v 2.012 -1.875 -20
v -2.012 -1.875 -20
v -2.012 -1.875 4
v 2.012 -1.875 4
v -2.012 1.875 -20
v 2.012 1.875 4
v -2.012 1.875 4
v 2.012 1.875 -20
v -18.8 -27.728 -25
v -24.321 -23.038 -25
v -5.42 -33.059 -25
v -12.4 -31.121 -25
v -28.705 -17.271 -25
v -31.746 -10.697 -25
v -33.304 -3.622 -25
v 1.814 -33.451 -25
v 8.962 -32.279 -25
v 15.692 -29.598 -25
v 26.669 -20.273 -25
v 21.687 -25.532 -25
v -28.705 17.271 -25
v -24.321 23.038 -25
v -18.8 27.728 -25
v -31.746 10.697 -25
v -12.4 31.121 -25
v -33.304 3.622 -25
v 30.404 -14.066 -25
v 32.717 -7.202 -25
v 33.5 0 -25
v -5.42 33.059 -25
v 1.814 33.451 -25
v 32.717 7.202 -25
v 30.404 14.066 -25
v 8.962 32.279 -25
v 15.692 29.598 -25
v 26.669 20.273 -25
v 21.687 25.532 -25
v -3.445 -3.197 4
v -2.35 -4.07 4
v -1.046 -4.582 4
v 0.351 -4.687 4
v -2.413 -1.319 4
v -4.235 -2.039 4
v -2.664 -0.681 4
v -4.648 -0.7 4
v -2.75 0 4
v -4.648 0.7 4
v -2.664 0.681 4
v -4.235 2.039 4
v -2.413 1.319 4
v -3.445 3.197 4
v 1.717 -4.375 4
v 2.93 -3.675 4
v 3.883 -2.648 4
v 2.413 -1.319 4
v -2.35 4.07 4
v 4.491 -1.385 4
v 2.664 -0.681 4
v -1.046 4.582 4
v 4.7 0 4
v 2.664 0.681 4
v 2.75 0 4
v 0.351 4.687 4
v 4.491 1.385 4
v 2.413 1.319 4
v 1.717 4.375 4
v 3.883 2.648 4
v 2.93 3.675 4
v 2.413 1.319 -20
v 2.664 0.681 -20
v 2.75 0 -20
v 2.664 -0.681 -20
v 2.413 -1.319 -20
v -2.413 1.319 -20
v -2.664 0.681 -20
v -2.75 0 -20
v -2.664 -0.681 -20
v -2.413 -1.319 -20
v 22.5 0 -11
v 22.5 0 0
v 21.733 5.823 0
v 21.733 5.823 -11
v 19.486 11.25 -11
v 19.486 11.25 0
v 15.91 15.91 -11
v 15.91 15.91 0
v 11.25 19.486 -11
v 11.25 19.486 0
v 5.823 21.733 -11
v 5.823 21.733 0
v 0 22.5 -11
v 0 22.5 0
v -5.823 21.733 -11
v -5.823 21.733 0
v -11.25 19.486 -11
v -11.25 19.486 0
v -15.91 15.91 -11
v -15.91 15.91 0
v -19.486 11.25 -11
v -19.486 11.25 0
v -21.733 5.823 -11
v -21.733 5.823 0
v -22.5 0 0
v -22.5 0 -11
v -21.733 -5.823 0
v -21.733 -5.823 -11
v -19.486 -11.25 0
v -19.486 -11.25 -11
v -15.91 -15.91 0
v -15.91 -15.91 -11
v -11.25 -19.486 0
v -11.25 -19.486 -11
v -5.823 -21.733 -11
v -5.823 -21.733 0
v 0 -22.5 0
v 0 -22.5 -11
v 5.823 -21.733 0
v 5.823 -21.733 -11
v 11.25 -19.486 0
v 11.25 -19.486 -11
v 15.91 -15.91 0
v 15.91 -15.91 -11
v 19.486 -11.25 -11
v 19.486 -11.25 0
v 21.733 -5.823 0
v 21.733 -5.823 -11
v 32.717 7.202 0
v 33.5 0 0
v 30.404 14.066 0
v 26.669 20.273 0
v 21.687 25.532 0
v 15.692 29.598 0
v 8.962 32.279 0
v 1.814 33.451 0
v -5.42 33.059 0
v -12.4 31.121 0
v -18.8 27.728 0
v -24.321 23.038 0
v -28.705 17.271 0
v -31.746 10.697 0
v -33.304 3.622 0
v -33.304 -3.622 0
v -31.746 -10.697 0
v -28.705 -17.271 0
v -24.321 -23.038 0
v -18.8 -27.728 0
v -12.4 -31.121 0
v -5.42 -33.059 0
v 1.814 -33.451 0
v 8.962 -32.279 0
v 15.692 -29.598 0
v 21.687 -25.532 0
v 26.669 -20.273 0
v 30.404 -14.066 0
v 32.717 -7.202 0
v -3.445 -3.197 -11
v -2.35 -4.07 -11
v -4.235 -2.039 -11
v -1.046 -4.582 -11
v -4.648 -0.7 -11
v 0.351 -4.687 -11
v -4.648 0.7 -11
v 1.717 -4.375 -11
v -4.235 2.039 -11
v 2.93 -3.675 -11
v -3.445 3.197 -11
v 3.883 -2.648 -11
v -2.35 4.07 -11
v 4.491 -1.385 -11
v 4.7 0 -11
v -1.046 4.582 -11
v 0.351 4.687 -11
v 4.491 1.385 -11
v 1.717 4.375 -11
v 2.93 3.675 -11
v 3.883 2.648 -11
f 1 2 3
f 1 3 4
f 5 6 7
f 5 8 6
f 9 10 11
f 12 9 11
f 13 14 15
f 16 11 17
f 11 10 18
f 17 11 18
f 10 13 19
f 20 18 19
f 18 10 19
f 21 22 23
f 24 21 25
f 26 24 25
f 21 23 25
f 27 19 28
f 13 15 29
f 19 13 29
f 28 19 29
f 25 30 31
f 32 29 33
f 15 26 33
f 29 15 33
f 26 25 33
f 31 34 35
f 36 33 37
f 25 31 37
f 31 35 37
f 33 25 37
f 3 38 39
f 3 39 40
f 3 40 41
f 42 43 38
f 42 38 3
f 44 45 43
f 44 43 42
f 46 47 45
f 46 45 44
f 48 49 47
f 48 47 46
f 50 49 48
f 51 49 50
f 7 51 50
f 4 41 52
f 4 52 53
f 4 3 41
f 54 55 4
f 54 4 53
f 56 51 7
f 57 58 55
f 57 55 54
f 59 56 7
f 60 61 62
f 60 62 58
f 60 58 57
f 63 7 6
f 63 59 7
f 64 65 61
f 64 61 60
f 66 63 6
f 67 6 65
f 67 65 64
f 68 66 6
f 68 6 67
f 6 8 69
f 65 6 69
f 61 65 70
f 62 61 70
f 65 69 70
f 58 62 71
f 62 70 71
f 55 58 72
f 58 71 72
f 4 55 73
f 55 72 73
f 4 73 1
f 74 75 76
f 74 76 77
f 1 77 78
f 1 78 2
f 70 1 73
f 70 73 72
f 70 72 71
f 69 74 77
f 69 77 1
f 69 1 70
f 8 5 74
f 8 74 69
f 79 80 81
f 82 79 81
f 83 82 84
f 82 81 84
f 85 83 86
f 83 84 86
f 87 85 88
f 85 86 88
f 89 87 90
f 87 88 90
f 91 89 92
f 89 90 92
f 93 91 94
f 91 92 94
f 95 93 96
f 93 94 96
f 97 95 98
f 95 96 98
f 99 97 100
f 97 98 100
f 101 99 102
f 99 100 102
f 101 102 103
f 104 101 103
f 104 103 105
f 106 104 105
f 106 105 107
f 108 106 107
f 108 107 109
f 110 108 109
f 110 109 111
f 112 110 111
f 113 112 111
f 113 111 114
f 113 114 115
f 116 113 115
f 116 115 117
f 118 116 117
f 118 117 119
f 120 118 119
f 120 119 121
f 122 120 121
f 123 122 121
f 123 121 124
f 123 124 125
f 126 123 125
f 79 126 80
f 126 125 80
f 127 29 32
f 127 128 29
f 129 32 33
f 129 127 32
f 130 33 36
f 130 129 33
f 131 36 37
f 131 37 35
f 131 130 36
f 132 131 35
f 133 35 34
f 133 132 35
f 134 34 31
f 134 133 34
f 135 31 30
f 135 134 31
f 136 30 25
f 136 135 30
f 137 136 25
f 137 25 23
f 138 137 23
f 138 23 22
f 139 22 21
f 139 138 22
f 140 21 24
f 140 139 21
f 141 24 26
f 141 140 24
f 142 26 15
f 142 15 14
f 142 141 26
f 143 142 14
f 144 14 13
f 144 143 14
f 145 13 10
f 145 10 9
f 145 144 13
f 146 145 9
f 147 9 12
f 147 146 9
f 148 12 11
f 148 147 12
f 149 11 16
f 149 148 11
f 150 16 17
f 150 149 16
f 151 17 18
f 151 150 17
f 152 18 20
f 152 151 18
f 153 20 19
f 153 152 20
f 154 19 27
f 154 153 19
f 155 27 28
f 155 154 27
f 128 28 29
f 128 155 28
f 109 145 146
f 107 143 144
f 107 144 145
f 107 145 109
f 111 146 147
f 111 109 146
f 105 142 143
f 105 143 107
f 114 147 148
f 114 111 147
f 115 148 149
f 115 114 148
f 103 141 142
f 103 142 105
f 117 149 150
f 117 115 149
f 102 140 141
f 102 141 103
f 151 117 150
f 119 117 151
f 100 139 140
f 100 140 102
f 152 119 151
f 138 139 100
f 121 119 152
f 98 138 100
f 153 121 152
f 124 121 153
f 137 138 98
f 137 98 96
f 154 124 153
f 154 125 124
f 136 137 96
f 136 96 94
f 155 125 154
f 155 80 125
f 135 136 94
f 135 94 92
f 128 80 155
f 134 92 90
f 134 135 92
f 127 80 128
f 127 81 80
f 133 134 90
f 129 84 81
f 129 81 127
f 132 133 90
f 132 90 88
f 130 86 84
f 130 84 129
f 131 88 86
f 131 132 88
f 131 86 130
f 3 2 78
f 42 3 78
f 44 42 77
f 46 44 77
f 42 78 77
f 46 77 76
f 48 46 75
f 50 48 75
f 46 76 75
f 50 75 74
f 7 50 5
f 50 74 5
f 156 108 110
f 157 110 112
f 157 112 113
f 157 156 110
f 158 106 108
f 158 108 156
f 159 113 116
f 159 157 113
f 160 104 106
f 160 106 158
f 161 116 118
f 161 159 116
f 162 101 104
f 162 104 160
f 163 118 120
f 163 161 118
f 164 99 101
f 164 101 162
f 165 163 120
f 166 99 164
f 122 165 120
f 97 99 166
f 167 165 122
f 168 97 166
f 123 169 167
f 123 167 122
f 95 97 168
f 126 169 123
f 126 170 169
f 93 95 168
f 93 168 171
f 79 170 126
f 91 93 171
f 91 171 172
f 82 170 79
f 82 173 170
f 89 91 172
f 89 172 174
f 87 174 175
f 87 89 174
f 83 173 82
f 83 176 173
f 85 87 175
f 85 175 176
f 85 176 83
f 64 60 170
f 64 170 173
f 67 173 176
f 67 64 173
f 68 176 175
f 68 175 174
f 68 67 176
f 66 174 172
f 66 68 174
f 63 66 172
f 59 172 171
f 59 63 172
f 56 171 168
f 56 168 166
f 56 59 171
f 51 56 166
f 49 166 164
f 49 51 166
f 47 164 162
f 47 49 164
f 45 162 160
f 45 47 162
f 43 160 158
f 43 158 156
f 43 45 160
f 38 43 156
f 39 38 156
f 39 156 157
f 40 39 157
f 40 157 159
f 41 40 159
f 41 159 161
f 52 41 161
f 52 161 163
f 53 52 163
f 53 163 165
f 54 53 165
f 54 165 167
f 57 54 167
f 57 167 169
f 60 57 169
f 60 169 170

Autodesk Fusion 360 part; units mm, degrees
sketch "Sketch1" plane through (0, 0, 0) normal (0, 0, 1) x (1, 0, 0)
  circle A0 centre (0, 0) radius 33.5
  dimension "d1" = 67
extrude "Extrude1" add sketch "Sketch1" against normal blind 25
sketch "Sketch2" plane through (0, 0, 0) normal (0, 0, 1) x (1, 0, 0)
  circle A0 centre (0, 0) radius 4.7
  circle A1 centre (0, 0) radius 2.75
  line L0 (2.75, 1.875) -> (-2.75, 1.875)
  line L1 (-2.75, 1.875) -> (-2.75, -1.875)
  line L2 (-2.75, -1.875) -> (2.75, -1.875)
  line L3 (2.75, -1.875) -> (2.75, 1.875)
  line L4 (2.75, 1.875) -> (-2.75, -1.875) construction
  line L5 (-2.75, 1.875) -> (2.75, -1.875) construction
  dimension "d4" = 9.4
  dimension "d7" = 5.5
  dimension "d8" = 3.75
extrude "Extrude2" add sketch "Sketch2" along normal blind 4 contours A0 | A1 L0 L2 | A1 L2 L3 | A1 L0 L3 | A1 L0 | A1 L2 | A1 L0 L1 | A1 L1 L2
extrude "Extrude3" cut sketch "Sketch2" along normal blind 7 and the other way blind 20 contours A1 L0 L2
sketch "Sketch3" plane through (0, 0, 0) normal (0, 0, 1) x (1, 0, 0)
  circle A0 centre (0, 0) radius 4.7
  circle A1 centre (0, 0) radius 33.5
  circle A2 centre (0, 0) radius 22.5
  line L0 (-2.0117, 1.875) -> (2.0117, 1.875)
  arc A3 (2.0117, -1.875) -> (2.0117, 1.875) centre (0, 0) ccw
  line L1 (2.0117, -1.875) -> (-2.0117, -1.875)
  arc A4 (-2.0117, 1.875) -> (-2.0117, -1.875) centre (0, 0) ccw
  circle A5 centre (0, 0) radius 4.7
  dimension "d13" = 45
extrude "Extrude4" cut sketch "Sketch3" against normal blind 11 contours A2
